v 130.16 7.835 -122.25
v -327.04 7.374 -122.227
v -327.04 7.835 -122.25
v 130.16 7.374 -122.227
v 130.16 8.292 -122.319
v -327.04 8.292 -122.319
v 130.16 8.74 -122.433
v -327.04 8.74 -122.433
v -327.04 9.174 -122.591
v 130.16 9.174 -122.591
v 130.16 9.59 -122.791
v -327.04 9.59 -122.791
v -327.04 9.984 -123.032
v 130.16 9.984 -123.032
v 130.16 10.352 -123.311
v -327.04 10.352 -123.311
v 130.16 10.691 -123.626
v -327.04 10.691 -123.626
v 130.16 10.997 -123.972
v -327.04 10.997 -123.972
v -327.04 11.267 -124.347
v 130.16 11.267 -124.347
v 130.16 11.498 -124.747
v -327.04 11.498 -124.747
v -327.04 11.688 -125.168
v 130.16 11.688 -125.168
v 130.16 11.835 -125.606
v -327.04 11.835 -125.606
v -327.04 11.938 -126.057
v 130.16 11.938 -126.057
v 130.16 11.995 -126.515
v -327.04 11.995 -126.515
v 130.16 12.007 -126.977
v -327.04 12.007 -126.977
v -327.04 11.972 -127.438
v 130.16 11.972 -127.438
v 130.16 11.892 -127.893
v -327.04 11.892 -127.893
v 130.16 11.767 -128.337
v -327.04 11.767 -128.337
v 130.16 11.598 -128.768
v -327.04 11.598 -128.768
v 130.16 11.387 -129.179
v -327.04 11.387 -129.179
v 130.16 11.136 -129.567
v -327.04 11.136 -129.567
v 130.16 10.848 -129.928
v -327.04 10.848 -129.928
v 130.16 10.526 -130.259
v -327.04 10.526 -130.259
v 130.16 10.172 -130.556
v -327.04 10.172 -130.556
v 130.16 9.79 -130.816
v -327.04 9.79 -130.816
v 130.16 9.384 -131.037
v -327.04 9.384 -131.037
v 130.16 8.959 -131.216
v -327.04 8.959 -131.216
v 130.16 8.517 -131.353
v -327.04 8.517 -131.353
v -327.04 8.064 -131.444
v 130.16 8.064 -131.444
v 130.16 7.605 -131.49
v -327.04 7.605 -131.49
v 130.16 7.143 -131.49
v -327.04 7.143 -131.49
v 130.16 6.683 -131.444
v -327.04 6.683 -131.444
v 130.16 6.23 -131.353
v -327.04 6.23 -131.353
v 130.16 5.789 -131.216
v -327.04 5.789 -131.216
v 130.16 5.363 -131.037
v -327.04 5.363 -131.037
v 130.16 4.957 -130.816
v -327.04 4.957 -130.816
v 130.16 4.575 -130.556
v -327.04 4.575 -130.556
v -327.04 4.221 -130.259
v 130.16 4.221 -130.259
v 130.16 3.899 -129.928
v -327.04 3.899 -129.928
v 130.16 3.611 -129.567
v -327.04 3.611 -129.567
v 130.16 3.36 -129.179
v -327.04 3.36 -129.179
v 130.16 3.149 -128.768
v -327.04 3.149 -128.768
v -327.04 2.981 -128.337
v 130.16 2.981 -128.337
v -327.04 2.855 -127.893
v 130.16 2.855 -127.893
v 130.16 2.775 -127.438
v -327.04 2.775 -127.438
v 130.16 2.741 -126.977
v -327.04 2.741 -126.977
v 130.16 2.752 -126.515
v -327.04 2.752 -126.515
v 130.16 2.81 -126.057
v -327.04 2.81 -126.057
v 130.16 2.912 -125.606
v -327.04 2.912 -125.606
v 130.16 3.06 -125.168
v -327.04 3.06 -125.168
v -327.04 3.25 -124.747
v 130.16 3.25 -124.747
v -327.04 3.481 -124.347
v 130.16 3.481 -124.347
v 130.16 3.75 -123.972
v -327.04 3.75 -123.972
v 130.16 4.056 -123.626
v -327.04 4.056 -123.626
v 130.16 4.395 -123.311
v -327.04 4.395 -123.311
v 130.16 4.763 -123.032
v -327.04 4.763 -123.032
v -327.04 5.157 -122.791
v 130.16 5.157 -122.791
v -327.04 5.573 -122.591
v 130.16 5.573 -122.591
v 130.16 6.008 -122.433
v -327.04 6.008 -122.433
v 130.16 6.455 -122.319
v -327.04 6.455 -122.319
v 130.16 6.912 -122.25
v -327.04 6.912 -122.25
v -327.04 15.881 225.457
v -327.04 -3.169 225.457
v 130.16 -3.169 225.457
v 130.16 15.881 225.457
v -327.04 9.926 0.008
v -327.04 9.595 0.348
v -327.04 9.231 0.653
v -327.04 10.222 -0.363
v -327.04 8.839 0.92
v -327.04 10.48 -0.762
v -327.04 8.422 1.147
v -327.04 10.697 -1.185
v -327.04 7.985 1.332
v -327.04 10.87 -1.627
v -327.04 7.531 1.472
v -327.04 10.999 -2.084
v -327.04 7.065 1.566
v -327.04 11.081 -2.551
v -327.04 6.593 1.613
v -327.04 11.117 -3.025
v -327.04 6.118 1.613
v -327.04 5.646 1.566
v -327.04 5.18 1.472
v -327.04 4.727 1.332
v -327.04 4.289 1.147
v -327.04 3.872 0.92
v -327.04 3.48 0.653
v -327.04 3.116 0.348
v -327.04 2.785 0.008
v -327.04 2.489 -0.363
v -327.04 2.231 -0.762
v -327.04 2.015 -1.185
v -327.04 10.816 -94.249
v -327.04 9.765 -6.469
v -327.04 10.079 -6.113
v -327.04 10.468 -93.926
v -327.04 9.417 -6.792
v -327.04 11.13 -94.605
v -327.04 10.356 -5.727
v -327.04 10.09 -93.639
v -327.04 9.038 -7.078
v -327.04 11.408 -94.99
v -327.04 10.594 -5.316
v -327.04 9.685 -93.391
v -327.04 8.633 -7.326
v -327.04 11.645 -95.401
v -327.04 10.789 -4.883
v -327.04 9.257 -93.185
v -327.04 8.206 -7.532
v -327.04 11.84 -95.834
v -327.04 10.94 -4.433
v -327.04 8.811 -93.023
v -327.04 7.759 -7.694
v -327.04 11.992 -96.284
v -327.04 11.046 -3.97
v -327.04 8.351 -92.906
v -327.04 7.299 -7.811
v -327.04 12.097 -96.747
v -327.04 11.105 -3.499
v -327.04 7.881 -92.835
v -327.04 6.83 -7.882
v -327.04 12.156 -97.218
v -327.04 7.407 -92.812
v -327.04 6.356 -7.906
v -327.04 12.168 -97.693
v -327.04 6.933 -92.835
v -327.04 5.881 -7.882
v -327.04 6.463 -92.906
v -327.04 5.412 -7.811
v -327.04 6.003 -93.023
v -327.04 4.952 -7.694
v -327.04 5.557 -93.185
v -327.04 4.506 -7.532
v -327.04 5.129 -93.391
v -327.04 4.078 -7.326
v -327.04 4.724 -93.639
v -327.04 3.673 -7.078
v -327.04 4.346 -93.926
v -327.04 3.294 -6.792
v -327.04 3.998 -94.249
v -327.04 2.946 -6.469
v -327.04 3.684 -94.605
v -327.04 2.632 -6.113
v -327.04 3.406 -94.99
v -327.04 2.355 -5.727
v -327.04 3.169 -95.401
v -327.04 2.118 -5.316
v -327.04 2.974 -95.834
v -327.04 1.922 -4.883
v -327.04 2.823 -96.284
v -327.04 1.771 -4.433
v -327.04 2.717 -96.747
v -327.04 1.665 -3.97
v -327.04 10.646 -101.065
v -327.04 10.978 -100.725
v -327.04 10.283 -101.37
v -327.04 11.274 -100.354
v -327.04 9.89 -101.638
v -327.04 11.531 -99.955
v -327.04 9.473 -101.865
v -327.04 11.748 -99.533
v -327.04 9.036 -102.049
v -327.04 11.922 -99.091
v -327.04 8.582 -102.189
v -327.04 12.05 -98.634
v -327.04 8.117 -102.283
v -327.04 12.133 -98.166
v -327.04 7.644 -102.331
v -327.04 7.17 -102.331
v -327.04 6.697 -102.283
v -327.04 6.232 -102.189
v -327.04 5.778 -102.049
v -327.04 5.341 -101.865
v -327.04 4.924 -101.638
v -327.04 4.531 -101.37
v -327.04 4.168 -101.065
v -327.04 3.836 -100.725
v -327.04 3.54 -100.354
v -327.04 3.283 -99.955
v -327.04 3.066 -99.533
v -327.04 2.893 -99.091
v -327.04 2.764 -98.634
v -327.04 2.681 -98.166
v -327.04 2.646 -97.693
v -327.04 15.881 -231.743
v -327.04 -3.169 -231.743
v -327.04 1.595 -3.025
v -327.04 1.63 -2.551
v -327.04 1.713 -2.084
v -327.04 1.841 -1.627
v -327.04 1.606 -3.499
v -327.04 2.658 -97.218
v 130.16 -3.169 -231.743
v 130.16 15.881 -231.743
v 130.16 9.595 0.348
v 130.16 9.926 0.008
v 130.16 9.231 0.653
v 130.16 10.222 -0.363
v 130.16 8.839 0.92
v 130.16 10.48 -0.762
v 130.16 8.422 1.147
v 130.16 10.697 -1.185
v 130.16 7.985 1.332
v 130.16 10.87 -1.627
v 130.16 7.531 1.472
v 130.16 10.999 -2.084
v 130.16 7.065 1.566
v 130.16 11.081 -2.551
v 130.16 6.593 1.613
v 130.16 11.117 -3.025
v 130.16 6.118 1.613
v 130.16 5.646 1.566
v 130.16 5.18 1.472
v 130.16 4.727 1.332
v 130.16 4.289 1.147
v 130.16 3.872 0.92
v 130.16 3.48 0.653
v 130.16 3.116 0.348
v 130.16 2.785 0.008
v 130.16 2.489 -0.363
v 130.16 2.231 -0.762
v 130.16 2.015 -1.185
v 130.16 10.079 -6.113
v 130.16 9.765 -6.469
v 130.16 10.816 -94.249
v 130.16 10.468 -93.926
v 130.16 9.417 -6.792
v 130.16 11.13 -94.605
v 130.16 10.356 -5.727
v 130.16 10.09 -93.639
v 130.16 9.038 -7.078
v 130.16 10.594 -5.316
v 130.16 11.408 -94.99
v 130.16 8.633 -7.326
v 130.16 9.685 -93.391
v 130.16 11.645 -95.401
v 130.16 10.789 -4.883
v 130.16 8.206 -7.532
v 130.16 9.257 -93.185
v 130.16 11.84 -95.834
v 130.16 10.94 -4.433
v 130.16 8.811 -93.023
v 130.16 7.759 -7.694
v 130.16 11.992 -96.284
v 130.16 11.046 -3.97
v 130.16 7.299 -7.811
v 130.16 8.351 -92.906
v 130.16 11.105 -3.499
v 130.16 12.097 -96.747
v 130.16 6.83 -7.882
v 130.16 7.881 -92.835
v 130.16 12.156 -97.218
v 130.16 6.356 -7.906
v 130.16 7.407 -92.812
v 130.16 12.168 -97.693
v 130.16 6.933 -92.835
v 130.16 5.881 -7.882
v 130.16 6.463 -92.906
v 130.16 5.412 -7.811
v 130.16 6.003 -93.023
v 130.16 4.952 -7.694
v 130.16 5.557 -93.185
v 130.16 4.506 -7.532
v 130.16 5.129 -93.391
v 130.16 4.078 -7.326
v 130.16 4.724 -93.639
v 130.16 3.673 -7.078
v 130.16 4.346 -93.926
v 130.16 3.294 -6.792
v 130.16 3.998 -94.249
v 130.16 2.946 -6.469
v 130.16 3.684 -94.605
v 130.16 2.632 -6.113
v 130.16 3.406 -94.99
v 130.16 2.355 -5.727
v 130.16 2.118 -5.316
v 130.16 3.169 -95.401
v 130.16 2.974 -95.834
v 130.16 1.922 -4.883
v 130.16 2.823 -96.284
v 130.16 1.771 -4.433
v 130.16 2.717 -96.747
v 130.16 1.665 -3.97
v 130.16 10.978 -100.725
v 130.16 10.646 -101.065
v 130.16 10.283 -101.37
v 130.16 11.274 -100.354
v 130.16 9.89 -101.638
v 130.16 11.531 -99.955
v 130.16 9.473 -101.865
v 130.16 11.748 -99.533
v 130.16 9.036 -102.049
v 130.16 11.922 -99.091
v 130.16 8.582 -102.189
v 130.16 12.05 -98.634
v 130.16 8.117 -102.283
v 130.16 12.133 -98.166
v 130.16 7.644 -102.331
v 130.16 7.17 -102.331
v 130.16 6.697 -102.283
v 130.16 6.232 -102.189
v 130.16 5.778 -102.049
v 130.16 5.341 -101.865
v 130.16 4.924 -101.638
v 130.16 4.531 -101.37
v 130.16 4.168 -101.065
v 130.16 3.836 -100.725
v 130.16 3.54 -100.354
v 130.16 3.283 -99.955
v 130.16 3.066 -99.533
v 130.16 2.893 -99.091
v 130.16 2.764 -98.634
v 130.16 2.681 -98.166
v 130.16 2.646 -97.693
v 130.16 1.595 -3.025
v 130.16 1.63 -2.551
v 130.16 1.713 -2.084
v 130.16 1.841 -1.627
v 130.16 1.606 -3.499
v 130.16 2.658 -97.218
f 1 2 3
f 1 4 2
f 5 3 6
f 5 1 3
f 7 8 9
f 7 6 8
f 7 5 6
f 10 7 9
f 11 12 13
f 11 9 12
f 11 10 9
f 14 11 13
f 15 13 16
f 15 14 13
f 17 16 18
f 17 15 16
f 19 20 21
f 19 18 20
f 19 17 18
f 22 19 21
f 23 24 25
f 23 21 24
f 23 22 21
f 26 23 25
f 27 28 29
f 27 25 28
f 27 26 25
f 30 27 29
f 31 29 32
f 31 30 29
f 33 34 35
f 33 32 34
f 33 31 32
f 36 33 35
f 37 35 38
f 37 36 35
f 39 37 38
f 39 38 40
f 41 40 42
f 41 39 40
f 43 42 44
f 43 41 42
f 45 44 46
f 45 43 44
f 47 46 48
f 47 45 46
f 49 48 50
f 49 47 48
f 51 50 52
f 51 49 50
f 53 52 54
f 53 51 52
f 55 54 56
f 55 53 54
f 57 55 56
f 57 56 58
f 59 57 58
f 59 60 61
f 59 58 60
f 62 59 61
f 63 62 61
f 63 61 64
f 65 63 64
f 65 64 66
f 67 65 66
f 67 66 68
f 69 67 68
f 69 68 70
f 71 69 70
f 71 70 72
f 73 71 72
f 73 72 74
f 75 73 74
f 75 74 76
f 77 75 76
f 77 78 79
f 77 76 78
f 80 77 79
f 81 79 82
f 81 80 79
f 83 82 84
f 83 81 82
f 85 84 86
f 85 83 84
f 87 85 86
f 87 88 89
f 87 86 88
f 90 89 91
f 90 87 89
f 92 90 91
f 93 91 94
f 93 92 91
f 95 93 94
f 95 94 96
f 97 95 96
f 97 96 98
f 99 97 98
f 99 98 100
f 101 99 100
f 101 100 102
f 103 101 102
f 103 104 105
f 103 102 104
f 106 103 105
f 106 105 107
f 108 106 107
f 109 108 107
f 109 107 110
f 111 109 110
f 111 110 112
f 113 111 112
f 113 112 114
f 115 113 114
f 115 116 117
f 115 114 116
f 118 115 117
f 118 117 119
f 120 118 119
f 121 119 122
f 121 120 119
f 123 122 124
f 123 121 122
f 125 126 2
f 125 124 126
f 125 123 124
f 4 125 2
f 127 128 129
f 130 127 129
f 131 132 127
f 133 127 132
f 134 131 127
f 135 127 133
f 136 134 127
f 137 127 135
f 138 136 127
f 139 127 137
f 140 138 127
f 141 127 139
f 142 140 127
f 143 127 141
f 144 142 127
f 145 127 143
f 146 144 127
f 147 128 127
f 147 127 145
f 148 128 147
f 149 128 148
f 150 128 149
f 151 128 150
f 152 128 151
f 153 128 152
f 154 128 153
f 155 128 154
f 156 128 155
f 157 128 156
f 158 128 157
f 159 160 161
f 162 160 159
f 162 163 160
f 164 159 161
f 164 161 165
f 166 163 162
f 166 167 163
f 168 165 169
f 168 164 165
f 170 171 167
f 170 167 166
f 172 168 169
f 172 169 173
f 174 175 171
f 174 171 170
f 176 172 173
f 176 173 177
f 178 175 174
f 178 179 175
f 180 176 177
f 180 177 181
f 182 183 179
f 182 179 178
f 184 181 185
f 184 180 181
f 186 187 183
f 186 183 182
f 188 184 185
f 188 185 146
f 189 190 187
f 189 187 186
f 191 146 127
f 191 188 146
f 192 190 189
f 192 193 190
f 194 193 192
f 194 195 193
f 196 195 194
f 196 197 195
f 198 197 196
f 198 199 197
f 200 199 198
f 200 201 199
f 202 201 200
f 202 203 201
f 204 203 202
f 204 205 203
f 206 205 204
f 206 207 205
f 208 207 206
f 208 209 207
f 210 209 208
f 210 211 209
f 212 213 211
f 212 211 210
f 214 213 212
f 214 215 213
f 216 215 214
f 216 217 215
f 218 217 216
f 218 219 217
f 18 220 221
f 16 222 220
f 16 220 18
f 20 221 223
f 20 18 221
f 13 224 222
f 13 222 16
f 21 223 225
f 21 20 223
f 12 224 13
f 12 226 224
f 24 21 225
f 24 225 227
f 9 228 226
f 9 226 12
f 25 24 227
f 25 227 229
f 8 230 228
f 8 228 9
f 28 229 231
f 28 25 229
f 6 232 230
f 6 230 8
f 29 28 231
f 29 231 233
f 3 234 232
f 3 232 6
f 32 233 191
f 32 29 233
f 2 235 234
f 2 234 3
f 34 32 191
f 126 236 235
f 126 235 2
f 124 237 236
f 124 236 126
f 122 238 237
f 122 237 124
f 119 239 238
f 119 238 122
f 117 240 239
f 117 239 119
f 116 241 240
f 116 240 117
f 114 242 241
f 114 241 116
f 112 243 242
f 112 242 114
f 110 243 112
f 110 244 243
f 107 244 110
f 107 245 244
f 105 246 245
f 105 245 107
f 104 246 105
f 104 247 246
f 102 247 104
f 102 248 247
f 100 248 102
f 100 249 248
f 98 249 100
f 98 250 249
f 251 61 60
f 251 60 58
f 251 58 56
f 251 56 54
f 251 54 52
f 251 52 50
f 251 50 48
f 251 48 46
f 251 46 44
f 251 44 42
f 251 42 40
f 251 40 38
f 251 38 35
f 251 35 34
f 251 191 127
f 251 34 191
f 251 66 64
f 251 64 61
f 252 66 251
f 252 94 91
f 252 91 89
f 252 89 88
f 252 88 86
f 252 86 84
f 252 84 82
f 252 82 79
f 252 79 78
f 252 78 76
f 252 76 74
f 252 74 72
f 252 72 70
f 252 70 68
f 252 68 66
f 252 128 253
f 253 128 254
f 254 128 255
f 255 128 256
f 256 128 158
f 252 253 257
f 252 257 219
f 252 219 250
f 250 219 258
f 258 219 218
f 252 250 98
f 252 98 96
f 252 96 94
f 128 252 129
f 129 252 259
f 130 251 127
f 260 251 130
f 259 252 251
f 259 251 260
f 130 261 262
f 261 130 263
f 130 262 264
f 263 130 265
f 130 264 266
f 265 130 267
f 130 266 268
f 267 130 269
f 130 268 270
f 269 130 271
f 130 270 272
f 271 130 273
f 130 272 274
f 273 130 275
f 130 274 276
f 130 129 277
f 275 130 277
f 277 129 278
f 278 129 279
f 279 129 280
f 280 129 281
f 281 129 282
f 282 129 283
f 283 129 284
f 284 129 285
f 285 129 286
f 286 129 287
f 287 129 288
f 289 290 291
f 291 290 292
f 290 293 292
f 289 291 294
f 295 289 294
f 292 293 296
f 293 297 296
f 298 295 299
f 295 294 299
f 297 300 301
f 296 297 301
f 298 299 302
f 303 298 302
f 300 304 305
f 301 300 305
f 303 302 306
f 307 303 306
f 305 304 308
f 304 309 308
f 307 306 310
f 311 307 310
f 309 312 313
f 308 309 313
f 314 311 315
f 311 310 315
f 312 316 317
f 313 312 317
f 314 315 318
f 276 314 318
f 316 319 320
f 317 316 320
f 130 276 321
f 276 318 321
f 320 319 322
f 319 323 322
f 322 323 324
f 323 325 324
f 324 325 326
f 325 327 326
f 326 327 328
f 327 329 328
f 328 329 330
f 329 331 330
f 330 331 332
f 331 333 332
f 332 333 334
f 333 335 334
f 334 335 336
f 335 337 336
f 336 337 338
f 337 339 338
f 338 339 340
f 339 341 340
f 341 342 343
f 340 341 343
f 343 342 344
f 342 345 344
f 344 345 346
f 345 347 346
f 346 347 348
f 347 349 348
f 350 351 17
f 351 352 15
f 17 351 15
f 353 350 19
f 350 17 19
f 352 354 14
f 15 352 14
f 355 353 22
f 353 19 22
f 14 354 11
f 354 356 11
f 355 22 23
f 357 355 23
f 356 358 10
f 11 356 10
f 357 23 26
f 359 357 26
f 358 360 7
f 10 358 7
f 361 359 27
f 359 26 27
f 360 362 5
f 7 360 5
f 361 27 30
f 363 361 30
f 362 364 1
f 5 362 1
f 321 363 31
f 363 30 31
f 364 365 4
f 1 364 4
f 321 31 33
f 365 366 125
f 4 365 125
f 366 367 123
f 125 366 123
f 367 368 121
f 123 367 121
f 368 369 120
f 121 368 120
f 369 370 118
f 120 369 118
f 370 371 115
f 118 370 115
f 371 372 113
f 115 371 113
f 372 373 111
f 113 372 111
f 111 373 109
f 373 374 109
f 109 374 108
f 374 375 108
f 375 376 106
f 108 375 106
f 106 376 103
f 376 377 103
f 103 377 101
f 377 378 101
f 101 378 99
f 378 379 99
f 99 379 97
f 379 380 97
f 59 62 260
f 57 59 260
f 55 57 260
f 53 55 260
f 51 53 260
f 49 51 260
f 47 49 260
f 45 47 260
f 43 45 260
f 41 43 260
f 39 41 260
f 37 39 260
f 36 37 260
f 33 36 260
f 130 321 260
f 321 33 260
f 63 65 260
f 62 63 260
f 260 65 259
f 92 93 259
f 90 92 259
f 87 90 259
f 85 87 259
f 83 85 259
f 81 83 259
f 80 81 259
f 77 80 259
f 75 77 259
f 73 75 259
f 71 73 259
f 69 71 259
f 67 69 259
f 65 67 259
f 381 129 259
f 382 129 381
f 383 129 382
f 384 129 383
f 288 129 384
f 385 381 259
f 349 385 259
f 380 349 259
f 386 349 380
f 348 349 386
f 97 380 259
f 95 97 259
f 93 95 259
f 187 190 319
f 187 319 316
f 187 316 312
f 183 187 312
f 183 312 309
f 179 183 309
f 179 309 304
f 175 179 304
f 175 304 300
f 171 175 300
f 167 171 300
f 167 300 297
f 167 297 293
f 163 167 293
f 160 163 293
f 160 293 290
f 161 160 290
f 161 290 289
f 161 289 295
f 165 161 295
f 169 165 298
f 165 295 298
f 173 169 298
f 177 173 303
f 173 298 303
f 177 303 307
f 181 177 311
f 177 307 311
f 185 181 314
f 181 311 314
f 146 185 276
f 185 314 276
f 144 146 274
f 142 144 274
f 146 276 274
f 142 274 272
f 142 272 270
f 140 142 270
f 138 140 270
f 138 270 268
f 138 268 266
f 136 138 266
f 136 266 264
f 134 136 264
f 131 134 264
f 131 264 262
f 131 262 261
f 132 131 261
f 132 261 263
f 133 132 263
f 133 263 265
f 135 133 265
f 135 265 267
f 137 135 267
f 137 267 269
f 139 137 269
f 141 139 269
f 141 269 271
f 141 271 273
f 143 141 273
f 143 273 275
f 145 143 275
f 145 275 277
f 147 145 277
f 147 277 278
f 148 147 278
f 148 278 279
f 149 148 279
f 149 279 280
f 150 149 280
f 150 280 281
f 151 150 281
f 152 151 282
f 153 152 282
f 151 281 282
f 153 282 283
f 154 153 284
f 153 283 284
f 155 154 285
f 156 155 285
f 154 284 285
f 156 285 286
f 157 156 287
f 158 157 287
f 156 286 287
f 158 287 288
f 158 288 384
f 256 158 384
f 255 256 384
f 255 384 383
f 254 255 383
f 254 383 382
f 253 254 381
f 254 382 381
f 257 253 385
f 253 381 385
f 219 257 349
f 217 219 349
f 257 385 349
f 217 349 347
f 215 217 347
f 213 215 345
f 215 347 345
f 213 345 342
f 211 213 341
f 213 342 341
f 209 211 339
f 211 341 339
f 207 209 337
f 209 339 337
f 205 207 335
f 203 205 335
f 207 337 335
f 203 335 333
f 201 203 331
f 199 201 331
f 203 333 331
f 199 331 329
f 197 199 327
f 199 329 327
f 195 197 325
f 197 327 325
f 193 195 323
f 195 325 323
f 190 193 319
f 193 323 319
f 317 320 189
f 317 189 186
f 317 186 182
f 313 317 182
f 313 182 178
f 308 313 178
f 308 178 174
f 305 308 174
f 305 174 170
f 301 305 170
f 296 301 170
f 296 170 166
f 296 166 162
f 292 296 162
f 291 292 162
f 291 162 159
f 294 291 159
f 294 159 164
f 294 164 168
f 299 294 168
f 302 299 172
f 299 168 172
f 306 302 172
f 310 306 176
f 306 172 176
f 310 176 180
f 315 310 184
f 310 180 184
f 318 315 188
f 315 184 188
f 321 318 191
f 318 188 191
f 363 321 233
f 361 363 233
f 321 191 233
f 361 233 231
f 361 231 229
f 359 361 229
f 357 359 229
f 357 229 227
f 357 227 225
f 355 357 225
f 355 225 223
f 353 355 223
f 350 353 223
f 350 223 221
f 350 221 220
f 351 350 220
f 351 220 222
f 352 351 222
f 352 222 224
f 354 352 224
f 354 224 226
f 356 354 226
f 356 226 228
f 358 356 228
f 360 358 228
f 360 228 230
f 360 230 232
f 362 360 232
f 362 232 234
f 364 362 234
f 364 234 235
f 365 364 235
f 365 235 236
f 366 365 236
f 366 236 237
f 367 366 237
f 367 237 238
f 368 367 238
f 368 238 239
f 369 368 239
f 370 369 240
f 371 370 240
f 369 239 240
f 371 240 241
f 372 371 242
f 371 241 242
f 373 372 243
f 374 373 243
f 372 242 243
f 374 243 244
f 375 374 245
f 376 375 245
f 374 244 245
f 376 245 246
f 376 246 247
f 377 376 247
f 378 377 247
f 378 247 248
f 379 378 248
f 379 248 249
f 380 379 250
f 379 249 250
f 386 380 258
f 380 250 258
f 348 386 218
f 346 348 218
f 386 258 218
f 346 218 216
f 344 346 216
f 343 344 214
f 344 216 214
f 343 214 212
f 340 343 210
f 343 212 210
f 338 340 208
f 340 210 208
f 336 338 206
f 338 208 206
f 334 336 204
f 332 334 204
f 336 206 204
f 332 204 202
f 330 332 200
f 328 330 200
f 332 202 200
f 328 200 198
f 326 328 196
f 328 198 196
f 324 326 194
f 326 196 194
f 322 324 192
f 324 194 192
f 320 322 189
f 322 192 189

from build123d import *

# Parameters (mm, degrees)
SKETCH2_W               = 304.8
SKETCH2_H               = 304.8
BOSS_EXTRUDE1_DEPTH     = 12.7
SKETCH3_R               = 3.175
CUT_EXTRUDE1_DEPTH      = 343.16151121
SKETCH4_R               = 3.175
CUT_EXTRUDE2_DEPTH      = 358.845553564
CUT_EXTRUDE3_DEPTH      = 343.16151121
CUT_EXTRUDE3_DEPTH_BACK = 343.16151121
SKETCH8_R               = 3.089580747
SCALE1_SCALE            = 1.5


with BuildPart() as part:
    # Sketch2 → Boss-Extrude1 (new body)
    with BuildSketch(Plane(origin=(0, 0, 0), x_dir=(1, 0, 0), z_dir=(0, 1, 0))):
        with Locations((-98.440191388, 2.55215311)):
            Rectangle(SKETCH2_W, SKETCH2_H)
    extrude(amount=BOSS_EXTRUDE1_DEPTH)

    # Sketch3 → Cut-Extrude1 (cut, through all)
    with BuildSketch(Plane(origin=(53.959808612, 0, 0), x_dir=(0, 0, -1), z_dir=(1, 0, 0))):
        with Locations((2.55215311, 6.35)):
            Circle(SKETCH3_R)
    extrude(amount=-CUT_EXTRUDE1_DEPTH, mode=Mode.SUBTRACT)

    # Sketch4 → Cut-Extrude2 (cut, through all)
    with BuildSketch(Plane(origin=(-250.840191388, 0, 32.101609765), x_dir=(0, 0, 1), z_dir=(-1, 0, 0))):
        with Locations((-97.607511841, 7.050929825)):
            Circle(SKETCH4_R)
    extrude(amount=-CUT_EXTRUDE2_DEPTH, mode=Mode.SUBTRACT)

    # Sketch8 → Cut-Extrude3 (cut, two sides: drawn at the far end of the back side and taken through both)
    with BuildSketch(Plane.ZY.offset(250.840191388).offset(-CUT_EXTRUDE3_DEPTH_BACK)):
        with Locations((-85.030883776, 7.028633546)):
            Circle(SKETCH8_R)
    extrude(amount=CUT_EXTRUDE3_DEPTH + CUT_EXTRUDE3_DEPTH_BACK, mode=Mode.SUBTRACT)


with BuildPart() as part_1:
    # Scale1: scaled about (-98.440191388, 6.338736644, -1.369646506)
    add(part.part.scale(SCALE1_SCALE).moved(Location((49.220095694, -3.169368322, 0.684823253))))


solid = part_1.part
